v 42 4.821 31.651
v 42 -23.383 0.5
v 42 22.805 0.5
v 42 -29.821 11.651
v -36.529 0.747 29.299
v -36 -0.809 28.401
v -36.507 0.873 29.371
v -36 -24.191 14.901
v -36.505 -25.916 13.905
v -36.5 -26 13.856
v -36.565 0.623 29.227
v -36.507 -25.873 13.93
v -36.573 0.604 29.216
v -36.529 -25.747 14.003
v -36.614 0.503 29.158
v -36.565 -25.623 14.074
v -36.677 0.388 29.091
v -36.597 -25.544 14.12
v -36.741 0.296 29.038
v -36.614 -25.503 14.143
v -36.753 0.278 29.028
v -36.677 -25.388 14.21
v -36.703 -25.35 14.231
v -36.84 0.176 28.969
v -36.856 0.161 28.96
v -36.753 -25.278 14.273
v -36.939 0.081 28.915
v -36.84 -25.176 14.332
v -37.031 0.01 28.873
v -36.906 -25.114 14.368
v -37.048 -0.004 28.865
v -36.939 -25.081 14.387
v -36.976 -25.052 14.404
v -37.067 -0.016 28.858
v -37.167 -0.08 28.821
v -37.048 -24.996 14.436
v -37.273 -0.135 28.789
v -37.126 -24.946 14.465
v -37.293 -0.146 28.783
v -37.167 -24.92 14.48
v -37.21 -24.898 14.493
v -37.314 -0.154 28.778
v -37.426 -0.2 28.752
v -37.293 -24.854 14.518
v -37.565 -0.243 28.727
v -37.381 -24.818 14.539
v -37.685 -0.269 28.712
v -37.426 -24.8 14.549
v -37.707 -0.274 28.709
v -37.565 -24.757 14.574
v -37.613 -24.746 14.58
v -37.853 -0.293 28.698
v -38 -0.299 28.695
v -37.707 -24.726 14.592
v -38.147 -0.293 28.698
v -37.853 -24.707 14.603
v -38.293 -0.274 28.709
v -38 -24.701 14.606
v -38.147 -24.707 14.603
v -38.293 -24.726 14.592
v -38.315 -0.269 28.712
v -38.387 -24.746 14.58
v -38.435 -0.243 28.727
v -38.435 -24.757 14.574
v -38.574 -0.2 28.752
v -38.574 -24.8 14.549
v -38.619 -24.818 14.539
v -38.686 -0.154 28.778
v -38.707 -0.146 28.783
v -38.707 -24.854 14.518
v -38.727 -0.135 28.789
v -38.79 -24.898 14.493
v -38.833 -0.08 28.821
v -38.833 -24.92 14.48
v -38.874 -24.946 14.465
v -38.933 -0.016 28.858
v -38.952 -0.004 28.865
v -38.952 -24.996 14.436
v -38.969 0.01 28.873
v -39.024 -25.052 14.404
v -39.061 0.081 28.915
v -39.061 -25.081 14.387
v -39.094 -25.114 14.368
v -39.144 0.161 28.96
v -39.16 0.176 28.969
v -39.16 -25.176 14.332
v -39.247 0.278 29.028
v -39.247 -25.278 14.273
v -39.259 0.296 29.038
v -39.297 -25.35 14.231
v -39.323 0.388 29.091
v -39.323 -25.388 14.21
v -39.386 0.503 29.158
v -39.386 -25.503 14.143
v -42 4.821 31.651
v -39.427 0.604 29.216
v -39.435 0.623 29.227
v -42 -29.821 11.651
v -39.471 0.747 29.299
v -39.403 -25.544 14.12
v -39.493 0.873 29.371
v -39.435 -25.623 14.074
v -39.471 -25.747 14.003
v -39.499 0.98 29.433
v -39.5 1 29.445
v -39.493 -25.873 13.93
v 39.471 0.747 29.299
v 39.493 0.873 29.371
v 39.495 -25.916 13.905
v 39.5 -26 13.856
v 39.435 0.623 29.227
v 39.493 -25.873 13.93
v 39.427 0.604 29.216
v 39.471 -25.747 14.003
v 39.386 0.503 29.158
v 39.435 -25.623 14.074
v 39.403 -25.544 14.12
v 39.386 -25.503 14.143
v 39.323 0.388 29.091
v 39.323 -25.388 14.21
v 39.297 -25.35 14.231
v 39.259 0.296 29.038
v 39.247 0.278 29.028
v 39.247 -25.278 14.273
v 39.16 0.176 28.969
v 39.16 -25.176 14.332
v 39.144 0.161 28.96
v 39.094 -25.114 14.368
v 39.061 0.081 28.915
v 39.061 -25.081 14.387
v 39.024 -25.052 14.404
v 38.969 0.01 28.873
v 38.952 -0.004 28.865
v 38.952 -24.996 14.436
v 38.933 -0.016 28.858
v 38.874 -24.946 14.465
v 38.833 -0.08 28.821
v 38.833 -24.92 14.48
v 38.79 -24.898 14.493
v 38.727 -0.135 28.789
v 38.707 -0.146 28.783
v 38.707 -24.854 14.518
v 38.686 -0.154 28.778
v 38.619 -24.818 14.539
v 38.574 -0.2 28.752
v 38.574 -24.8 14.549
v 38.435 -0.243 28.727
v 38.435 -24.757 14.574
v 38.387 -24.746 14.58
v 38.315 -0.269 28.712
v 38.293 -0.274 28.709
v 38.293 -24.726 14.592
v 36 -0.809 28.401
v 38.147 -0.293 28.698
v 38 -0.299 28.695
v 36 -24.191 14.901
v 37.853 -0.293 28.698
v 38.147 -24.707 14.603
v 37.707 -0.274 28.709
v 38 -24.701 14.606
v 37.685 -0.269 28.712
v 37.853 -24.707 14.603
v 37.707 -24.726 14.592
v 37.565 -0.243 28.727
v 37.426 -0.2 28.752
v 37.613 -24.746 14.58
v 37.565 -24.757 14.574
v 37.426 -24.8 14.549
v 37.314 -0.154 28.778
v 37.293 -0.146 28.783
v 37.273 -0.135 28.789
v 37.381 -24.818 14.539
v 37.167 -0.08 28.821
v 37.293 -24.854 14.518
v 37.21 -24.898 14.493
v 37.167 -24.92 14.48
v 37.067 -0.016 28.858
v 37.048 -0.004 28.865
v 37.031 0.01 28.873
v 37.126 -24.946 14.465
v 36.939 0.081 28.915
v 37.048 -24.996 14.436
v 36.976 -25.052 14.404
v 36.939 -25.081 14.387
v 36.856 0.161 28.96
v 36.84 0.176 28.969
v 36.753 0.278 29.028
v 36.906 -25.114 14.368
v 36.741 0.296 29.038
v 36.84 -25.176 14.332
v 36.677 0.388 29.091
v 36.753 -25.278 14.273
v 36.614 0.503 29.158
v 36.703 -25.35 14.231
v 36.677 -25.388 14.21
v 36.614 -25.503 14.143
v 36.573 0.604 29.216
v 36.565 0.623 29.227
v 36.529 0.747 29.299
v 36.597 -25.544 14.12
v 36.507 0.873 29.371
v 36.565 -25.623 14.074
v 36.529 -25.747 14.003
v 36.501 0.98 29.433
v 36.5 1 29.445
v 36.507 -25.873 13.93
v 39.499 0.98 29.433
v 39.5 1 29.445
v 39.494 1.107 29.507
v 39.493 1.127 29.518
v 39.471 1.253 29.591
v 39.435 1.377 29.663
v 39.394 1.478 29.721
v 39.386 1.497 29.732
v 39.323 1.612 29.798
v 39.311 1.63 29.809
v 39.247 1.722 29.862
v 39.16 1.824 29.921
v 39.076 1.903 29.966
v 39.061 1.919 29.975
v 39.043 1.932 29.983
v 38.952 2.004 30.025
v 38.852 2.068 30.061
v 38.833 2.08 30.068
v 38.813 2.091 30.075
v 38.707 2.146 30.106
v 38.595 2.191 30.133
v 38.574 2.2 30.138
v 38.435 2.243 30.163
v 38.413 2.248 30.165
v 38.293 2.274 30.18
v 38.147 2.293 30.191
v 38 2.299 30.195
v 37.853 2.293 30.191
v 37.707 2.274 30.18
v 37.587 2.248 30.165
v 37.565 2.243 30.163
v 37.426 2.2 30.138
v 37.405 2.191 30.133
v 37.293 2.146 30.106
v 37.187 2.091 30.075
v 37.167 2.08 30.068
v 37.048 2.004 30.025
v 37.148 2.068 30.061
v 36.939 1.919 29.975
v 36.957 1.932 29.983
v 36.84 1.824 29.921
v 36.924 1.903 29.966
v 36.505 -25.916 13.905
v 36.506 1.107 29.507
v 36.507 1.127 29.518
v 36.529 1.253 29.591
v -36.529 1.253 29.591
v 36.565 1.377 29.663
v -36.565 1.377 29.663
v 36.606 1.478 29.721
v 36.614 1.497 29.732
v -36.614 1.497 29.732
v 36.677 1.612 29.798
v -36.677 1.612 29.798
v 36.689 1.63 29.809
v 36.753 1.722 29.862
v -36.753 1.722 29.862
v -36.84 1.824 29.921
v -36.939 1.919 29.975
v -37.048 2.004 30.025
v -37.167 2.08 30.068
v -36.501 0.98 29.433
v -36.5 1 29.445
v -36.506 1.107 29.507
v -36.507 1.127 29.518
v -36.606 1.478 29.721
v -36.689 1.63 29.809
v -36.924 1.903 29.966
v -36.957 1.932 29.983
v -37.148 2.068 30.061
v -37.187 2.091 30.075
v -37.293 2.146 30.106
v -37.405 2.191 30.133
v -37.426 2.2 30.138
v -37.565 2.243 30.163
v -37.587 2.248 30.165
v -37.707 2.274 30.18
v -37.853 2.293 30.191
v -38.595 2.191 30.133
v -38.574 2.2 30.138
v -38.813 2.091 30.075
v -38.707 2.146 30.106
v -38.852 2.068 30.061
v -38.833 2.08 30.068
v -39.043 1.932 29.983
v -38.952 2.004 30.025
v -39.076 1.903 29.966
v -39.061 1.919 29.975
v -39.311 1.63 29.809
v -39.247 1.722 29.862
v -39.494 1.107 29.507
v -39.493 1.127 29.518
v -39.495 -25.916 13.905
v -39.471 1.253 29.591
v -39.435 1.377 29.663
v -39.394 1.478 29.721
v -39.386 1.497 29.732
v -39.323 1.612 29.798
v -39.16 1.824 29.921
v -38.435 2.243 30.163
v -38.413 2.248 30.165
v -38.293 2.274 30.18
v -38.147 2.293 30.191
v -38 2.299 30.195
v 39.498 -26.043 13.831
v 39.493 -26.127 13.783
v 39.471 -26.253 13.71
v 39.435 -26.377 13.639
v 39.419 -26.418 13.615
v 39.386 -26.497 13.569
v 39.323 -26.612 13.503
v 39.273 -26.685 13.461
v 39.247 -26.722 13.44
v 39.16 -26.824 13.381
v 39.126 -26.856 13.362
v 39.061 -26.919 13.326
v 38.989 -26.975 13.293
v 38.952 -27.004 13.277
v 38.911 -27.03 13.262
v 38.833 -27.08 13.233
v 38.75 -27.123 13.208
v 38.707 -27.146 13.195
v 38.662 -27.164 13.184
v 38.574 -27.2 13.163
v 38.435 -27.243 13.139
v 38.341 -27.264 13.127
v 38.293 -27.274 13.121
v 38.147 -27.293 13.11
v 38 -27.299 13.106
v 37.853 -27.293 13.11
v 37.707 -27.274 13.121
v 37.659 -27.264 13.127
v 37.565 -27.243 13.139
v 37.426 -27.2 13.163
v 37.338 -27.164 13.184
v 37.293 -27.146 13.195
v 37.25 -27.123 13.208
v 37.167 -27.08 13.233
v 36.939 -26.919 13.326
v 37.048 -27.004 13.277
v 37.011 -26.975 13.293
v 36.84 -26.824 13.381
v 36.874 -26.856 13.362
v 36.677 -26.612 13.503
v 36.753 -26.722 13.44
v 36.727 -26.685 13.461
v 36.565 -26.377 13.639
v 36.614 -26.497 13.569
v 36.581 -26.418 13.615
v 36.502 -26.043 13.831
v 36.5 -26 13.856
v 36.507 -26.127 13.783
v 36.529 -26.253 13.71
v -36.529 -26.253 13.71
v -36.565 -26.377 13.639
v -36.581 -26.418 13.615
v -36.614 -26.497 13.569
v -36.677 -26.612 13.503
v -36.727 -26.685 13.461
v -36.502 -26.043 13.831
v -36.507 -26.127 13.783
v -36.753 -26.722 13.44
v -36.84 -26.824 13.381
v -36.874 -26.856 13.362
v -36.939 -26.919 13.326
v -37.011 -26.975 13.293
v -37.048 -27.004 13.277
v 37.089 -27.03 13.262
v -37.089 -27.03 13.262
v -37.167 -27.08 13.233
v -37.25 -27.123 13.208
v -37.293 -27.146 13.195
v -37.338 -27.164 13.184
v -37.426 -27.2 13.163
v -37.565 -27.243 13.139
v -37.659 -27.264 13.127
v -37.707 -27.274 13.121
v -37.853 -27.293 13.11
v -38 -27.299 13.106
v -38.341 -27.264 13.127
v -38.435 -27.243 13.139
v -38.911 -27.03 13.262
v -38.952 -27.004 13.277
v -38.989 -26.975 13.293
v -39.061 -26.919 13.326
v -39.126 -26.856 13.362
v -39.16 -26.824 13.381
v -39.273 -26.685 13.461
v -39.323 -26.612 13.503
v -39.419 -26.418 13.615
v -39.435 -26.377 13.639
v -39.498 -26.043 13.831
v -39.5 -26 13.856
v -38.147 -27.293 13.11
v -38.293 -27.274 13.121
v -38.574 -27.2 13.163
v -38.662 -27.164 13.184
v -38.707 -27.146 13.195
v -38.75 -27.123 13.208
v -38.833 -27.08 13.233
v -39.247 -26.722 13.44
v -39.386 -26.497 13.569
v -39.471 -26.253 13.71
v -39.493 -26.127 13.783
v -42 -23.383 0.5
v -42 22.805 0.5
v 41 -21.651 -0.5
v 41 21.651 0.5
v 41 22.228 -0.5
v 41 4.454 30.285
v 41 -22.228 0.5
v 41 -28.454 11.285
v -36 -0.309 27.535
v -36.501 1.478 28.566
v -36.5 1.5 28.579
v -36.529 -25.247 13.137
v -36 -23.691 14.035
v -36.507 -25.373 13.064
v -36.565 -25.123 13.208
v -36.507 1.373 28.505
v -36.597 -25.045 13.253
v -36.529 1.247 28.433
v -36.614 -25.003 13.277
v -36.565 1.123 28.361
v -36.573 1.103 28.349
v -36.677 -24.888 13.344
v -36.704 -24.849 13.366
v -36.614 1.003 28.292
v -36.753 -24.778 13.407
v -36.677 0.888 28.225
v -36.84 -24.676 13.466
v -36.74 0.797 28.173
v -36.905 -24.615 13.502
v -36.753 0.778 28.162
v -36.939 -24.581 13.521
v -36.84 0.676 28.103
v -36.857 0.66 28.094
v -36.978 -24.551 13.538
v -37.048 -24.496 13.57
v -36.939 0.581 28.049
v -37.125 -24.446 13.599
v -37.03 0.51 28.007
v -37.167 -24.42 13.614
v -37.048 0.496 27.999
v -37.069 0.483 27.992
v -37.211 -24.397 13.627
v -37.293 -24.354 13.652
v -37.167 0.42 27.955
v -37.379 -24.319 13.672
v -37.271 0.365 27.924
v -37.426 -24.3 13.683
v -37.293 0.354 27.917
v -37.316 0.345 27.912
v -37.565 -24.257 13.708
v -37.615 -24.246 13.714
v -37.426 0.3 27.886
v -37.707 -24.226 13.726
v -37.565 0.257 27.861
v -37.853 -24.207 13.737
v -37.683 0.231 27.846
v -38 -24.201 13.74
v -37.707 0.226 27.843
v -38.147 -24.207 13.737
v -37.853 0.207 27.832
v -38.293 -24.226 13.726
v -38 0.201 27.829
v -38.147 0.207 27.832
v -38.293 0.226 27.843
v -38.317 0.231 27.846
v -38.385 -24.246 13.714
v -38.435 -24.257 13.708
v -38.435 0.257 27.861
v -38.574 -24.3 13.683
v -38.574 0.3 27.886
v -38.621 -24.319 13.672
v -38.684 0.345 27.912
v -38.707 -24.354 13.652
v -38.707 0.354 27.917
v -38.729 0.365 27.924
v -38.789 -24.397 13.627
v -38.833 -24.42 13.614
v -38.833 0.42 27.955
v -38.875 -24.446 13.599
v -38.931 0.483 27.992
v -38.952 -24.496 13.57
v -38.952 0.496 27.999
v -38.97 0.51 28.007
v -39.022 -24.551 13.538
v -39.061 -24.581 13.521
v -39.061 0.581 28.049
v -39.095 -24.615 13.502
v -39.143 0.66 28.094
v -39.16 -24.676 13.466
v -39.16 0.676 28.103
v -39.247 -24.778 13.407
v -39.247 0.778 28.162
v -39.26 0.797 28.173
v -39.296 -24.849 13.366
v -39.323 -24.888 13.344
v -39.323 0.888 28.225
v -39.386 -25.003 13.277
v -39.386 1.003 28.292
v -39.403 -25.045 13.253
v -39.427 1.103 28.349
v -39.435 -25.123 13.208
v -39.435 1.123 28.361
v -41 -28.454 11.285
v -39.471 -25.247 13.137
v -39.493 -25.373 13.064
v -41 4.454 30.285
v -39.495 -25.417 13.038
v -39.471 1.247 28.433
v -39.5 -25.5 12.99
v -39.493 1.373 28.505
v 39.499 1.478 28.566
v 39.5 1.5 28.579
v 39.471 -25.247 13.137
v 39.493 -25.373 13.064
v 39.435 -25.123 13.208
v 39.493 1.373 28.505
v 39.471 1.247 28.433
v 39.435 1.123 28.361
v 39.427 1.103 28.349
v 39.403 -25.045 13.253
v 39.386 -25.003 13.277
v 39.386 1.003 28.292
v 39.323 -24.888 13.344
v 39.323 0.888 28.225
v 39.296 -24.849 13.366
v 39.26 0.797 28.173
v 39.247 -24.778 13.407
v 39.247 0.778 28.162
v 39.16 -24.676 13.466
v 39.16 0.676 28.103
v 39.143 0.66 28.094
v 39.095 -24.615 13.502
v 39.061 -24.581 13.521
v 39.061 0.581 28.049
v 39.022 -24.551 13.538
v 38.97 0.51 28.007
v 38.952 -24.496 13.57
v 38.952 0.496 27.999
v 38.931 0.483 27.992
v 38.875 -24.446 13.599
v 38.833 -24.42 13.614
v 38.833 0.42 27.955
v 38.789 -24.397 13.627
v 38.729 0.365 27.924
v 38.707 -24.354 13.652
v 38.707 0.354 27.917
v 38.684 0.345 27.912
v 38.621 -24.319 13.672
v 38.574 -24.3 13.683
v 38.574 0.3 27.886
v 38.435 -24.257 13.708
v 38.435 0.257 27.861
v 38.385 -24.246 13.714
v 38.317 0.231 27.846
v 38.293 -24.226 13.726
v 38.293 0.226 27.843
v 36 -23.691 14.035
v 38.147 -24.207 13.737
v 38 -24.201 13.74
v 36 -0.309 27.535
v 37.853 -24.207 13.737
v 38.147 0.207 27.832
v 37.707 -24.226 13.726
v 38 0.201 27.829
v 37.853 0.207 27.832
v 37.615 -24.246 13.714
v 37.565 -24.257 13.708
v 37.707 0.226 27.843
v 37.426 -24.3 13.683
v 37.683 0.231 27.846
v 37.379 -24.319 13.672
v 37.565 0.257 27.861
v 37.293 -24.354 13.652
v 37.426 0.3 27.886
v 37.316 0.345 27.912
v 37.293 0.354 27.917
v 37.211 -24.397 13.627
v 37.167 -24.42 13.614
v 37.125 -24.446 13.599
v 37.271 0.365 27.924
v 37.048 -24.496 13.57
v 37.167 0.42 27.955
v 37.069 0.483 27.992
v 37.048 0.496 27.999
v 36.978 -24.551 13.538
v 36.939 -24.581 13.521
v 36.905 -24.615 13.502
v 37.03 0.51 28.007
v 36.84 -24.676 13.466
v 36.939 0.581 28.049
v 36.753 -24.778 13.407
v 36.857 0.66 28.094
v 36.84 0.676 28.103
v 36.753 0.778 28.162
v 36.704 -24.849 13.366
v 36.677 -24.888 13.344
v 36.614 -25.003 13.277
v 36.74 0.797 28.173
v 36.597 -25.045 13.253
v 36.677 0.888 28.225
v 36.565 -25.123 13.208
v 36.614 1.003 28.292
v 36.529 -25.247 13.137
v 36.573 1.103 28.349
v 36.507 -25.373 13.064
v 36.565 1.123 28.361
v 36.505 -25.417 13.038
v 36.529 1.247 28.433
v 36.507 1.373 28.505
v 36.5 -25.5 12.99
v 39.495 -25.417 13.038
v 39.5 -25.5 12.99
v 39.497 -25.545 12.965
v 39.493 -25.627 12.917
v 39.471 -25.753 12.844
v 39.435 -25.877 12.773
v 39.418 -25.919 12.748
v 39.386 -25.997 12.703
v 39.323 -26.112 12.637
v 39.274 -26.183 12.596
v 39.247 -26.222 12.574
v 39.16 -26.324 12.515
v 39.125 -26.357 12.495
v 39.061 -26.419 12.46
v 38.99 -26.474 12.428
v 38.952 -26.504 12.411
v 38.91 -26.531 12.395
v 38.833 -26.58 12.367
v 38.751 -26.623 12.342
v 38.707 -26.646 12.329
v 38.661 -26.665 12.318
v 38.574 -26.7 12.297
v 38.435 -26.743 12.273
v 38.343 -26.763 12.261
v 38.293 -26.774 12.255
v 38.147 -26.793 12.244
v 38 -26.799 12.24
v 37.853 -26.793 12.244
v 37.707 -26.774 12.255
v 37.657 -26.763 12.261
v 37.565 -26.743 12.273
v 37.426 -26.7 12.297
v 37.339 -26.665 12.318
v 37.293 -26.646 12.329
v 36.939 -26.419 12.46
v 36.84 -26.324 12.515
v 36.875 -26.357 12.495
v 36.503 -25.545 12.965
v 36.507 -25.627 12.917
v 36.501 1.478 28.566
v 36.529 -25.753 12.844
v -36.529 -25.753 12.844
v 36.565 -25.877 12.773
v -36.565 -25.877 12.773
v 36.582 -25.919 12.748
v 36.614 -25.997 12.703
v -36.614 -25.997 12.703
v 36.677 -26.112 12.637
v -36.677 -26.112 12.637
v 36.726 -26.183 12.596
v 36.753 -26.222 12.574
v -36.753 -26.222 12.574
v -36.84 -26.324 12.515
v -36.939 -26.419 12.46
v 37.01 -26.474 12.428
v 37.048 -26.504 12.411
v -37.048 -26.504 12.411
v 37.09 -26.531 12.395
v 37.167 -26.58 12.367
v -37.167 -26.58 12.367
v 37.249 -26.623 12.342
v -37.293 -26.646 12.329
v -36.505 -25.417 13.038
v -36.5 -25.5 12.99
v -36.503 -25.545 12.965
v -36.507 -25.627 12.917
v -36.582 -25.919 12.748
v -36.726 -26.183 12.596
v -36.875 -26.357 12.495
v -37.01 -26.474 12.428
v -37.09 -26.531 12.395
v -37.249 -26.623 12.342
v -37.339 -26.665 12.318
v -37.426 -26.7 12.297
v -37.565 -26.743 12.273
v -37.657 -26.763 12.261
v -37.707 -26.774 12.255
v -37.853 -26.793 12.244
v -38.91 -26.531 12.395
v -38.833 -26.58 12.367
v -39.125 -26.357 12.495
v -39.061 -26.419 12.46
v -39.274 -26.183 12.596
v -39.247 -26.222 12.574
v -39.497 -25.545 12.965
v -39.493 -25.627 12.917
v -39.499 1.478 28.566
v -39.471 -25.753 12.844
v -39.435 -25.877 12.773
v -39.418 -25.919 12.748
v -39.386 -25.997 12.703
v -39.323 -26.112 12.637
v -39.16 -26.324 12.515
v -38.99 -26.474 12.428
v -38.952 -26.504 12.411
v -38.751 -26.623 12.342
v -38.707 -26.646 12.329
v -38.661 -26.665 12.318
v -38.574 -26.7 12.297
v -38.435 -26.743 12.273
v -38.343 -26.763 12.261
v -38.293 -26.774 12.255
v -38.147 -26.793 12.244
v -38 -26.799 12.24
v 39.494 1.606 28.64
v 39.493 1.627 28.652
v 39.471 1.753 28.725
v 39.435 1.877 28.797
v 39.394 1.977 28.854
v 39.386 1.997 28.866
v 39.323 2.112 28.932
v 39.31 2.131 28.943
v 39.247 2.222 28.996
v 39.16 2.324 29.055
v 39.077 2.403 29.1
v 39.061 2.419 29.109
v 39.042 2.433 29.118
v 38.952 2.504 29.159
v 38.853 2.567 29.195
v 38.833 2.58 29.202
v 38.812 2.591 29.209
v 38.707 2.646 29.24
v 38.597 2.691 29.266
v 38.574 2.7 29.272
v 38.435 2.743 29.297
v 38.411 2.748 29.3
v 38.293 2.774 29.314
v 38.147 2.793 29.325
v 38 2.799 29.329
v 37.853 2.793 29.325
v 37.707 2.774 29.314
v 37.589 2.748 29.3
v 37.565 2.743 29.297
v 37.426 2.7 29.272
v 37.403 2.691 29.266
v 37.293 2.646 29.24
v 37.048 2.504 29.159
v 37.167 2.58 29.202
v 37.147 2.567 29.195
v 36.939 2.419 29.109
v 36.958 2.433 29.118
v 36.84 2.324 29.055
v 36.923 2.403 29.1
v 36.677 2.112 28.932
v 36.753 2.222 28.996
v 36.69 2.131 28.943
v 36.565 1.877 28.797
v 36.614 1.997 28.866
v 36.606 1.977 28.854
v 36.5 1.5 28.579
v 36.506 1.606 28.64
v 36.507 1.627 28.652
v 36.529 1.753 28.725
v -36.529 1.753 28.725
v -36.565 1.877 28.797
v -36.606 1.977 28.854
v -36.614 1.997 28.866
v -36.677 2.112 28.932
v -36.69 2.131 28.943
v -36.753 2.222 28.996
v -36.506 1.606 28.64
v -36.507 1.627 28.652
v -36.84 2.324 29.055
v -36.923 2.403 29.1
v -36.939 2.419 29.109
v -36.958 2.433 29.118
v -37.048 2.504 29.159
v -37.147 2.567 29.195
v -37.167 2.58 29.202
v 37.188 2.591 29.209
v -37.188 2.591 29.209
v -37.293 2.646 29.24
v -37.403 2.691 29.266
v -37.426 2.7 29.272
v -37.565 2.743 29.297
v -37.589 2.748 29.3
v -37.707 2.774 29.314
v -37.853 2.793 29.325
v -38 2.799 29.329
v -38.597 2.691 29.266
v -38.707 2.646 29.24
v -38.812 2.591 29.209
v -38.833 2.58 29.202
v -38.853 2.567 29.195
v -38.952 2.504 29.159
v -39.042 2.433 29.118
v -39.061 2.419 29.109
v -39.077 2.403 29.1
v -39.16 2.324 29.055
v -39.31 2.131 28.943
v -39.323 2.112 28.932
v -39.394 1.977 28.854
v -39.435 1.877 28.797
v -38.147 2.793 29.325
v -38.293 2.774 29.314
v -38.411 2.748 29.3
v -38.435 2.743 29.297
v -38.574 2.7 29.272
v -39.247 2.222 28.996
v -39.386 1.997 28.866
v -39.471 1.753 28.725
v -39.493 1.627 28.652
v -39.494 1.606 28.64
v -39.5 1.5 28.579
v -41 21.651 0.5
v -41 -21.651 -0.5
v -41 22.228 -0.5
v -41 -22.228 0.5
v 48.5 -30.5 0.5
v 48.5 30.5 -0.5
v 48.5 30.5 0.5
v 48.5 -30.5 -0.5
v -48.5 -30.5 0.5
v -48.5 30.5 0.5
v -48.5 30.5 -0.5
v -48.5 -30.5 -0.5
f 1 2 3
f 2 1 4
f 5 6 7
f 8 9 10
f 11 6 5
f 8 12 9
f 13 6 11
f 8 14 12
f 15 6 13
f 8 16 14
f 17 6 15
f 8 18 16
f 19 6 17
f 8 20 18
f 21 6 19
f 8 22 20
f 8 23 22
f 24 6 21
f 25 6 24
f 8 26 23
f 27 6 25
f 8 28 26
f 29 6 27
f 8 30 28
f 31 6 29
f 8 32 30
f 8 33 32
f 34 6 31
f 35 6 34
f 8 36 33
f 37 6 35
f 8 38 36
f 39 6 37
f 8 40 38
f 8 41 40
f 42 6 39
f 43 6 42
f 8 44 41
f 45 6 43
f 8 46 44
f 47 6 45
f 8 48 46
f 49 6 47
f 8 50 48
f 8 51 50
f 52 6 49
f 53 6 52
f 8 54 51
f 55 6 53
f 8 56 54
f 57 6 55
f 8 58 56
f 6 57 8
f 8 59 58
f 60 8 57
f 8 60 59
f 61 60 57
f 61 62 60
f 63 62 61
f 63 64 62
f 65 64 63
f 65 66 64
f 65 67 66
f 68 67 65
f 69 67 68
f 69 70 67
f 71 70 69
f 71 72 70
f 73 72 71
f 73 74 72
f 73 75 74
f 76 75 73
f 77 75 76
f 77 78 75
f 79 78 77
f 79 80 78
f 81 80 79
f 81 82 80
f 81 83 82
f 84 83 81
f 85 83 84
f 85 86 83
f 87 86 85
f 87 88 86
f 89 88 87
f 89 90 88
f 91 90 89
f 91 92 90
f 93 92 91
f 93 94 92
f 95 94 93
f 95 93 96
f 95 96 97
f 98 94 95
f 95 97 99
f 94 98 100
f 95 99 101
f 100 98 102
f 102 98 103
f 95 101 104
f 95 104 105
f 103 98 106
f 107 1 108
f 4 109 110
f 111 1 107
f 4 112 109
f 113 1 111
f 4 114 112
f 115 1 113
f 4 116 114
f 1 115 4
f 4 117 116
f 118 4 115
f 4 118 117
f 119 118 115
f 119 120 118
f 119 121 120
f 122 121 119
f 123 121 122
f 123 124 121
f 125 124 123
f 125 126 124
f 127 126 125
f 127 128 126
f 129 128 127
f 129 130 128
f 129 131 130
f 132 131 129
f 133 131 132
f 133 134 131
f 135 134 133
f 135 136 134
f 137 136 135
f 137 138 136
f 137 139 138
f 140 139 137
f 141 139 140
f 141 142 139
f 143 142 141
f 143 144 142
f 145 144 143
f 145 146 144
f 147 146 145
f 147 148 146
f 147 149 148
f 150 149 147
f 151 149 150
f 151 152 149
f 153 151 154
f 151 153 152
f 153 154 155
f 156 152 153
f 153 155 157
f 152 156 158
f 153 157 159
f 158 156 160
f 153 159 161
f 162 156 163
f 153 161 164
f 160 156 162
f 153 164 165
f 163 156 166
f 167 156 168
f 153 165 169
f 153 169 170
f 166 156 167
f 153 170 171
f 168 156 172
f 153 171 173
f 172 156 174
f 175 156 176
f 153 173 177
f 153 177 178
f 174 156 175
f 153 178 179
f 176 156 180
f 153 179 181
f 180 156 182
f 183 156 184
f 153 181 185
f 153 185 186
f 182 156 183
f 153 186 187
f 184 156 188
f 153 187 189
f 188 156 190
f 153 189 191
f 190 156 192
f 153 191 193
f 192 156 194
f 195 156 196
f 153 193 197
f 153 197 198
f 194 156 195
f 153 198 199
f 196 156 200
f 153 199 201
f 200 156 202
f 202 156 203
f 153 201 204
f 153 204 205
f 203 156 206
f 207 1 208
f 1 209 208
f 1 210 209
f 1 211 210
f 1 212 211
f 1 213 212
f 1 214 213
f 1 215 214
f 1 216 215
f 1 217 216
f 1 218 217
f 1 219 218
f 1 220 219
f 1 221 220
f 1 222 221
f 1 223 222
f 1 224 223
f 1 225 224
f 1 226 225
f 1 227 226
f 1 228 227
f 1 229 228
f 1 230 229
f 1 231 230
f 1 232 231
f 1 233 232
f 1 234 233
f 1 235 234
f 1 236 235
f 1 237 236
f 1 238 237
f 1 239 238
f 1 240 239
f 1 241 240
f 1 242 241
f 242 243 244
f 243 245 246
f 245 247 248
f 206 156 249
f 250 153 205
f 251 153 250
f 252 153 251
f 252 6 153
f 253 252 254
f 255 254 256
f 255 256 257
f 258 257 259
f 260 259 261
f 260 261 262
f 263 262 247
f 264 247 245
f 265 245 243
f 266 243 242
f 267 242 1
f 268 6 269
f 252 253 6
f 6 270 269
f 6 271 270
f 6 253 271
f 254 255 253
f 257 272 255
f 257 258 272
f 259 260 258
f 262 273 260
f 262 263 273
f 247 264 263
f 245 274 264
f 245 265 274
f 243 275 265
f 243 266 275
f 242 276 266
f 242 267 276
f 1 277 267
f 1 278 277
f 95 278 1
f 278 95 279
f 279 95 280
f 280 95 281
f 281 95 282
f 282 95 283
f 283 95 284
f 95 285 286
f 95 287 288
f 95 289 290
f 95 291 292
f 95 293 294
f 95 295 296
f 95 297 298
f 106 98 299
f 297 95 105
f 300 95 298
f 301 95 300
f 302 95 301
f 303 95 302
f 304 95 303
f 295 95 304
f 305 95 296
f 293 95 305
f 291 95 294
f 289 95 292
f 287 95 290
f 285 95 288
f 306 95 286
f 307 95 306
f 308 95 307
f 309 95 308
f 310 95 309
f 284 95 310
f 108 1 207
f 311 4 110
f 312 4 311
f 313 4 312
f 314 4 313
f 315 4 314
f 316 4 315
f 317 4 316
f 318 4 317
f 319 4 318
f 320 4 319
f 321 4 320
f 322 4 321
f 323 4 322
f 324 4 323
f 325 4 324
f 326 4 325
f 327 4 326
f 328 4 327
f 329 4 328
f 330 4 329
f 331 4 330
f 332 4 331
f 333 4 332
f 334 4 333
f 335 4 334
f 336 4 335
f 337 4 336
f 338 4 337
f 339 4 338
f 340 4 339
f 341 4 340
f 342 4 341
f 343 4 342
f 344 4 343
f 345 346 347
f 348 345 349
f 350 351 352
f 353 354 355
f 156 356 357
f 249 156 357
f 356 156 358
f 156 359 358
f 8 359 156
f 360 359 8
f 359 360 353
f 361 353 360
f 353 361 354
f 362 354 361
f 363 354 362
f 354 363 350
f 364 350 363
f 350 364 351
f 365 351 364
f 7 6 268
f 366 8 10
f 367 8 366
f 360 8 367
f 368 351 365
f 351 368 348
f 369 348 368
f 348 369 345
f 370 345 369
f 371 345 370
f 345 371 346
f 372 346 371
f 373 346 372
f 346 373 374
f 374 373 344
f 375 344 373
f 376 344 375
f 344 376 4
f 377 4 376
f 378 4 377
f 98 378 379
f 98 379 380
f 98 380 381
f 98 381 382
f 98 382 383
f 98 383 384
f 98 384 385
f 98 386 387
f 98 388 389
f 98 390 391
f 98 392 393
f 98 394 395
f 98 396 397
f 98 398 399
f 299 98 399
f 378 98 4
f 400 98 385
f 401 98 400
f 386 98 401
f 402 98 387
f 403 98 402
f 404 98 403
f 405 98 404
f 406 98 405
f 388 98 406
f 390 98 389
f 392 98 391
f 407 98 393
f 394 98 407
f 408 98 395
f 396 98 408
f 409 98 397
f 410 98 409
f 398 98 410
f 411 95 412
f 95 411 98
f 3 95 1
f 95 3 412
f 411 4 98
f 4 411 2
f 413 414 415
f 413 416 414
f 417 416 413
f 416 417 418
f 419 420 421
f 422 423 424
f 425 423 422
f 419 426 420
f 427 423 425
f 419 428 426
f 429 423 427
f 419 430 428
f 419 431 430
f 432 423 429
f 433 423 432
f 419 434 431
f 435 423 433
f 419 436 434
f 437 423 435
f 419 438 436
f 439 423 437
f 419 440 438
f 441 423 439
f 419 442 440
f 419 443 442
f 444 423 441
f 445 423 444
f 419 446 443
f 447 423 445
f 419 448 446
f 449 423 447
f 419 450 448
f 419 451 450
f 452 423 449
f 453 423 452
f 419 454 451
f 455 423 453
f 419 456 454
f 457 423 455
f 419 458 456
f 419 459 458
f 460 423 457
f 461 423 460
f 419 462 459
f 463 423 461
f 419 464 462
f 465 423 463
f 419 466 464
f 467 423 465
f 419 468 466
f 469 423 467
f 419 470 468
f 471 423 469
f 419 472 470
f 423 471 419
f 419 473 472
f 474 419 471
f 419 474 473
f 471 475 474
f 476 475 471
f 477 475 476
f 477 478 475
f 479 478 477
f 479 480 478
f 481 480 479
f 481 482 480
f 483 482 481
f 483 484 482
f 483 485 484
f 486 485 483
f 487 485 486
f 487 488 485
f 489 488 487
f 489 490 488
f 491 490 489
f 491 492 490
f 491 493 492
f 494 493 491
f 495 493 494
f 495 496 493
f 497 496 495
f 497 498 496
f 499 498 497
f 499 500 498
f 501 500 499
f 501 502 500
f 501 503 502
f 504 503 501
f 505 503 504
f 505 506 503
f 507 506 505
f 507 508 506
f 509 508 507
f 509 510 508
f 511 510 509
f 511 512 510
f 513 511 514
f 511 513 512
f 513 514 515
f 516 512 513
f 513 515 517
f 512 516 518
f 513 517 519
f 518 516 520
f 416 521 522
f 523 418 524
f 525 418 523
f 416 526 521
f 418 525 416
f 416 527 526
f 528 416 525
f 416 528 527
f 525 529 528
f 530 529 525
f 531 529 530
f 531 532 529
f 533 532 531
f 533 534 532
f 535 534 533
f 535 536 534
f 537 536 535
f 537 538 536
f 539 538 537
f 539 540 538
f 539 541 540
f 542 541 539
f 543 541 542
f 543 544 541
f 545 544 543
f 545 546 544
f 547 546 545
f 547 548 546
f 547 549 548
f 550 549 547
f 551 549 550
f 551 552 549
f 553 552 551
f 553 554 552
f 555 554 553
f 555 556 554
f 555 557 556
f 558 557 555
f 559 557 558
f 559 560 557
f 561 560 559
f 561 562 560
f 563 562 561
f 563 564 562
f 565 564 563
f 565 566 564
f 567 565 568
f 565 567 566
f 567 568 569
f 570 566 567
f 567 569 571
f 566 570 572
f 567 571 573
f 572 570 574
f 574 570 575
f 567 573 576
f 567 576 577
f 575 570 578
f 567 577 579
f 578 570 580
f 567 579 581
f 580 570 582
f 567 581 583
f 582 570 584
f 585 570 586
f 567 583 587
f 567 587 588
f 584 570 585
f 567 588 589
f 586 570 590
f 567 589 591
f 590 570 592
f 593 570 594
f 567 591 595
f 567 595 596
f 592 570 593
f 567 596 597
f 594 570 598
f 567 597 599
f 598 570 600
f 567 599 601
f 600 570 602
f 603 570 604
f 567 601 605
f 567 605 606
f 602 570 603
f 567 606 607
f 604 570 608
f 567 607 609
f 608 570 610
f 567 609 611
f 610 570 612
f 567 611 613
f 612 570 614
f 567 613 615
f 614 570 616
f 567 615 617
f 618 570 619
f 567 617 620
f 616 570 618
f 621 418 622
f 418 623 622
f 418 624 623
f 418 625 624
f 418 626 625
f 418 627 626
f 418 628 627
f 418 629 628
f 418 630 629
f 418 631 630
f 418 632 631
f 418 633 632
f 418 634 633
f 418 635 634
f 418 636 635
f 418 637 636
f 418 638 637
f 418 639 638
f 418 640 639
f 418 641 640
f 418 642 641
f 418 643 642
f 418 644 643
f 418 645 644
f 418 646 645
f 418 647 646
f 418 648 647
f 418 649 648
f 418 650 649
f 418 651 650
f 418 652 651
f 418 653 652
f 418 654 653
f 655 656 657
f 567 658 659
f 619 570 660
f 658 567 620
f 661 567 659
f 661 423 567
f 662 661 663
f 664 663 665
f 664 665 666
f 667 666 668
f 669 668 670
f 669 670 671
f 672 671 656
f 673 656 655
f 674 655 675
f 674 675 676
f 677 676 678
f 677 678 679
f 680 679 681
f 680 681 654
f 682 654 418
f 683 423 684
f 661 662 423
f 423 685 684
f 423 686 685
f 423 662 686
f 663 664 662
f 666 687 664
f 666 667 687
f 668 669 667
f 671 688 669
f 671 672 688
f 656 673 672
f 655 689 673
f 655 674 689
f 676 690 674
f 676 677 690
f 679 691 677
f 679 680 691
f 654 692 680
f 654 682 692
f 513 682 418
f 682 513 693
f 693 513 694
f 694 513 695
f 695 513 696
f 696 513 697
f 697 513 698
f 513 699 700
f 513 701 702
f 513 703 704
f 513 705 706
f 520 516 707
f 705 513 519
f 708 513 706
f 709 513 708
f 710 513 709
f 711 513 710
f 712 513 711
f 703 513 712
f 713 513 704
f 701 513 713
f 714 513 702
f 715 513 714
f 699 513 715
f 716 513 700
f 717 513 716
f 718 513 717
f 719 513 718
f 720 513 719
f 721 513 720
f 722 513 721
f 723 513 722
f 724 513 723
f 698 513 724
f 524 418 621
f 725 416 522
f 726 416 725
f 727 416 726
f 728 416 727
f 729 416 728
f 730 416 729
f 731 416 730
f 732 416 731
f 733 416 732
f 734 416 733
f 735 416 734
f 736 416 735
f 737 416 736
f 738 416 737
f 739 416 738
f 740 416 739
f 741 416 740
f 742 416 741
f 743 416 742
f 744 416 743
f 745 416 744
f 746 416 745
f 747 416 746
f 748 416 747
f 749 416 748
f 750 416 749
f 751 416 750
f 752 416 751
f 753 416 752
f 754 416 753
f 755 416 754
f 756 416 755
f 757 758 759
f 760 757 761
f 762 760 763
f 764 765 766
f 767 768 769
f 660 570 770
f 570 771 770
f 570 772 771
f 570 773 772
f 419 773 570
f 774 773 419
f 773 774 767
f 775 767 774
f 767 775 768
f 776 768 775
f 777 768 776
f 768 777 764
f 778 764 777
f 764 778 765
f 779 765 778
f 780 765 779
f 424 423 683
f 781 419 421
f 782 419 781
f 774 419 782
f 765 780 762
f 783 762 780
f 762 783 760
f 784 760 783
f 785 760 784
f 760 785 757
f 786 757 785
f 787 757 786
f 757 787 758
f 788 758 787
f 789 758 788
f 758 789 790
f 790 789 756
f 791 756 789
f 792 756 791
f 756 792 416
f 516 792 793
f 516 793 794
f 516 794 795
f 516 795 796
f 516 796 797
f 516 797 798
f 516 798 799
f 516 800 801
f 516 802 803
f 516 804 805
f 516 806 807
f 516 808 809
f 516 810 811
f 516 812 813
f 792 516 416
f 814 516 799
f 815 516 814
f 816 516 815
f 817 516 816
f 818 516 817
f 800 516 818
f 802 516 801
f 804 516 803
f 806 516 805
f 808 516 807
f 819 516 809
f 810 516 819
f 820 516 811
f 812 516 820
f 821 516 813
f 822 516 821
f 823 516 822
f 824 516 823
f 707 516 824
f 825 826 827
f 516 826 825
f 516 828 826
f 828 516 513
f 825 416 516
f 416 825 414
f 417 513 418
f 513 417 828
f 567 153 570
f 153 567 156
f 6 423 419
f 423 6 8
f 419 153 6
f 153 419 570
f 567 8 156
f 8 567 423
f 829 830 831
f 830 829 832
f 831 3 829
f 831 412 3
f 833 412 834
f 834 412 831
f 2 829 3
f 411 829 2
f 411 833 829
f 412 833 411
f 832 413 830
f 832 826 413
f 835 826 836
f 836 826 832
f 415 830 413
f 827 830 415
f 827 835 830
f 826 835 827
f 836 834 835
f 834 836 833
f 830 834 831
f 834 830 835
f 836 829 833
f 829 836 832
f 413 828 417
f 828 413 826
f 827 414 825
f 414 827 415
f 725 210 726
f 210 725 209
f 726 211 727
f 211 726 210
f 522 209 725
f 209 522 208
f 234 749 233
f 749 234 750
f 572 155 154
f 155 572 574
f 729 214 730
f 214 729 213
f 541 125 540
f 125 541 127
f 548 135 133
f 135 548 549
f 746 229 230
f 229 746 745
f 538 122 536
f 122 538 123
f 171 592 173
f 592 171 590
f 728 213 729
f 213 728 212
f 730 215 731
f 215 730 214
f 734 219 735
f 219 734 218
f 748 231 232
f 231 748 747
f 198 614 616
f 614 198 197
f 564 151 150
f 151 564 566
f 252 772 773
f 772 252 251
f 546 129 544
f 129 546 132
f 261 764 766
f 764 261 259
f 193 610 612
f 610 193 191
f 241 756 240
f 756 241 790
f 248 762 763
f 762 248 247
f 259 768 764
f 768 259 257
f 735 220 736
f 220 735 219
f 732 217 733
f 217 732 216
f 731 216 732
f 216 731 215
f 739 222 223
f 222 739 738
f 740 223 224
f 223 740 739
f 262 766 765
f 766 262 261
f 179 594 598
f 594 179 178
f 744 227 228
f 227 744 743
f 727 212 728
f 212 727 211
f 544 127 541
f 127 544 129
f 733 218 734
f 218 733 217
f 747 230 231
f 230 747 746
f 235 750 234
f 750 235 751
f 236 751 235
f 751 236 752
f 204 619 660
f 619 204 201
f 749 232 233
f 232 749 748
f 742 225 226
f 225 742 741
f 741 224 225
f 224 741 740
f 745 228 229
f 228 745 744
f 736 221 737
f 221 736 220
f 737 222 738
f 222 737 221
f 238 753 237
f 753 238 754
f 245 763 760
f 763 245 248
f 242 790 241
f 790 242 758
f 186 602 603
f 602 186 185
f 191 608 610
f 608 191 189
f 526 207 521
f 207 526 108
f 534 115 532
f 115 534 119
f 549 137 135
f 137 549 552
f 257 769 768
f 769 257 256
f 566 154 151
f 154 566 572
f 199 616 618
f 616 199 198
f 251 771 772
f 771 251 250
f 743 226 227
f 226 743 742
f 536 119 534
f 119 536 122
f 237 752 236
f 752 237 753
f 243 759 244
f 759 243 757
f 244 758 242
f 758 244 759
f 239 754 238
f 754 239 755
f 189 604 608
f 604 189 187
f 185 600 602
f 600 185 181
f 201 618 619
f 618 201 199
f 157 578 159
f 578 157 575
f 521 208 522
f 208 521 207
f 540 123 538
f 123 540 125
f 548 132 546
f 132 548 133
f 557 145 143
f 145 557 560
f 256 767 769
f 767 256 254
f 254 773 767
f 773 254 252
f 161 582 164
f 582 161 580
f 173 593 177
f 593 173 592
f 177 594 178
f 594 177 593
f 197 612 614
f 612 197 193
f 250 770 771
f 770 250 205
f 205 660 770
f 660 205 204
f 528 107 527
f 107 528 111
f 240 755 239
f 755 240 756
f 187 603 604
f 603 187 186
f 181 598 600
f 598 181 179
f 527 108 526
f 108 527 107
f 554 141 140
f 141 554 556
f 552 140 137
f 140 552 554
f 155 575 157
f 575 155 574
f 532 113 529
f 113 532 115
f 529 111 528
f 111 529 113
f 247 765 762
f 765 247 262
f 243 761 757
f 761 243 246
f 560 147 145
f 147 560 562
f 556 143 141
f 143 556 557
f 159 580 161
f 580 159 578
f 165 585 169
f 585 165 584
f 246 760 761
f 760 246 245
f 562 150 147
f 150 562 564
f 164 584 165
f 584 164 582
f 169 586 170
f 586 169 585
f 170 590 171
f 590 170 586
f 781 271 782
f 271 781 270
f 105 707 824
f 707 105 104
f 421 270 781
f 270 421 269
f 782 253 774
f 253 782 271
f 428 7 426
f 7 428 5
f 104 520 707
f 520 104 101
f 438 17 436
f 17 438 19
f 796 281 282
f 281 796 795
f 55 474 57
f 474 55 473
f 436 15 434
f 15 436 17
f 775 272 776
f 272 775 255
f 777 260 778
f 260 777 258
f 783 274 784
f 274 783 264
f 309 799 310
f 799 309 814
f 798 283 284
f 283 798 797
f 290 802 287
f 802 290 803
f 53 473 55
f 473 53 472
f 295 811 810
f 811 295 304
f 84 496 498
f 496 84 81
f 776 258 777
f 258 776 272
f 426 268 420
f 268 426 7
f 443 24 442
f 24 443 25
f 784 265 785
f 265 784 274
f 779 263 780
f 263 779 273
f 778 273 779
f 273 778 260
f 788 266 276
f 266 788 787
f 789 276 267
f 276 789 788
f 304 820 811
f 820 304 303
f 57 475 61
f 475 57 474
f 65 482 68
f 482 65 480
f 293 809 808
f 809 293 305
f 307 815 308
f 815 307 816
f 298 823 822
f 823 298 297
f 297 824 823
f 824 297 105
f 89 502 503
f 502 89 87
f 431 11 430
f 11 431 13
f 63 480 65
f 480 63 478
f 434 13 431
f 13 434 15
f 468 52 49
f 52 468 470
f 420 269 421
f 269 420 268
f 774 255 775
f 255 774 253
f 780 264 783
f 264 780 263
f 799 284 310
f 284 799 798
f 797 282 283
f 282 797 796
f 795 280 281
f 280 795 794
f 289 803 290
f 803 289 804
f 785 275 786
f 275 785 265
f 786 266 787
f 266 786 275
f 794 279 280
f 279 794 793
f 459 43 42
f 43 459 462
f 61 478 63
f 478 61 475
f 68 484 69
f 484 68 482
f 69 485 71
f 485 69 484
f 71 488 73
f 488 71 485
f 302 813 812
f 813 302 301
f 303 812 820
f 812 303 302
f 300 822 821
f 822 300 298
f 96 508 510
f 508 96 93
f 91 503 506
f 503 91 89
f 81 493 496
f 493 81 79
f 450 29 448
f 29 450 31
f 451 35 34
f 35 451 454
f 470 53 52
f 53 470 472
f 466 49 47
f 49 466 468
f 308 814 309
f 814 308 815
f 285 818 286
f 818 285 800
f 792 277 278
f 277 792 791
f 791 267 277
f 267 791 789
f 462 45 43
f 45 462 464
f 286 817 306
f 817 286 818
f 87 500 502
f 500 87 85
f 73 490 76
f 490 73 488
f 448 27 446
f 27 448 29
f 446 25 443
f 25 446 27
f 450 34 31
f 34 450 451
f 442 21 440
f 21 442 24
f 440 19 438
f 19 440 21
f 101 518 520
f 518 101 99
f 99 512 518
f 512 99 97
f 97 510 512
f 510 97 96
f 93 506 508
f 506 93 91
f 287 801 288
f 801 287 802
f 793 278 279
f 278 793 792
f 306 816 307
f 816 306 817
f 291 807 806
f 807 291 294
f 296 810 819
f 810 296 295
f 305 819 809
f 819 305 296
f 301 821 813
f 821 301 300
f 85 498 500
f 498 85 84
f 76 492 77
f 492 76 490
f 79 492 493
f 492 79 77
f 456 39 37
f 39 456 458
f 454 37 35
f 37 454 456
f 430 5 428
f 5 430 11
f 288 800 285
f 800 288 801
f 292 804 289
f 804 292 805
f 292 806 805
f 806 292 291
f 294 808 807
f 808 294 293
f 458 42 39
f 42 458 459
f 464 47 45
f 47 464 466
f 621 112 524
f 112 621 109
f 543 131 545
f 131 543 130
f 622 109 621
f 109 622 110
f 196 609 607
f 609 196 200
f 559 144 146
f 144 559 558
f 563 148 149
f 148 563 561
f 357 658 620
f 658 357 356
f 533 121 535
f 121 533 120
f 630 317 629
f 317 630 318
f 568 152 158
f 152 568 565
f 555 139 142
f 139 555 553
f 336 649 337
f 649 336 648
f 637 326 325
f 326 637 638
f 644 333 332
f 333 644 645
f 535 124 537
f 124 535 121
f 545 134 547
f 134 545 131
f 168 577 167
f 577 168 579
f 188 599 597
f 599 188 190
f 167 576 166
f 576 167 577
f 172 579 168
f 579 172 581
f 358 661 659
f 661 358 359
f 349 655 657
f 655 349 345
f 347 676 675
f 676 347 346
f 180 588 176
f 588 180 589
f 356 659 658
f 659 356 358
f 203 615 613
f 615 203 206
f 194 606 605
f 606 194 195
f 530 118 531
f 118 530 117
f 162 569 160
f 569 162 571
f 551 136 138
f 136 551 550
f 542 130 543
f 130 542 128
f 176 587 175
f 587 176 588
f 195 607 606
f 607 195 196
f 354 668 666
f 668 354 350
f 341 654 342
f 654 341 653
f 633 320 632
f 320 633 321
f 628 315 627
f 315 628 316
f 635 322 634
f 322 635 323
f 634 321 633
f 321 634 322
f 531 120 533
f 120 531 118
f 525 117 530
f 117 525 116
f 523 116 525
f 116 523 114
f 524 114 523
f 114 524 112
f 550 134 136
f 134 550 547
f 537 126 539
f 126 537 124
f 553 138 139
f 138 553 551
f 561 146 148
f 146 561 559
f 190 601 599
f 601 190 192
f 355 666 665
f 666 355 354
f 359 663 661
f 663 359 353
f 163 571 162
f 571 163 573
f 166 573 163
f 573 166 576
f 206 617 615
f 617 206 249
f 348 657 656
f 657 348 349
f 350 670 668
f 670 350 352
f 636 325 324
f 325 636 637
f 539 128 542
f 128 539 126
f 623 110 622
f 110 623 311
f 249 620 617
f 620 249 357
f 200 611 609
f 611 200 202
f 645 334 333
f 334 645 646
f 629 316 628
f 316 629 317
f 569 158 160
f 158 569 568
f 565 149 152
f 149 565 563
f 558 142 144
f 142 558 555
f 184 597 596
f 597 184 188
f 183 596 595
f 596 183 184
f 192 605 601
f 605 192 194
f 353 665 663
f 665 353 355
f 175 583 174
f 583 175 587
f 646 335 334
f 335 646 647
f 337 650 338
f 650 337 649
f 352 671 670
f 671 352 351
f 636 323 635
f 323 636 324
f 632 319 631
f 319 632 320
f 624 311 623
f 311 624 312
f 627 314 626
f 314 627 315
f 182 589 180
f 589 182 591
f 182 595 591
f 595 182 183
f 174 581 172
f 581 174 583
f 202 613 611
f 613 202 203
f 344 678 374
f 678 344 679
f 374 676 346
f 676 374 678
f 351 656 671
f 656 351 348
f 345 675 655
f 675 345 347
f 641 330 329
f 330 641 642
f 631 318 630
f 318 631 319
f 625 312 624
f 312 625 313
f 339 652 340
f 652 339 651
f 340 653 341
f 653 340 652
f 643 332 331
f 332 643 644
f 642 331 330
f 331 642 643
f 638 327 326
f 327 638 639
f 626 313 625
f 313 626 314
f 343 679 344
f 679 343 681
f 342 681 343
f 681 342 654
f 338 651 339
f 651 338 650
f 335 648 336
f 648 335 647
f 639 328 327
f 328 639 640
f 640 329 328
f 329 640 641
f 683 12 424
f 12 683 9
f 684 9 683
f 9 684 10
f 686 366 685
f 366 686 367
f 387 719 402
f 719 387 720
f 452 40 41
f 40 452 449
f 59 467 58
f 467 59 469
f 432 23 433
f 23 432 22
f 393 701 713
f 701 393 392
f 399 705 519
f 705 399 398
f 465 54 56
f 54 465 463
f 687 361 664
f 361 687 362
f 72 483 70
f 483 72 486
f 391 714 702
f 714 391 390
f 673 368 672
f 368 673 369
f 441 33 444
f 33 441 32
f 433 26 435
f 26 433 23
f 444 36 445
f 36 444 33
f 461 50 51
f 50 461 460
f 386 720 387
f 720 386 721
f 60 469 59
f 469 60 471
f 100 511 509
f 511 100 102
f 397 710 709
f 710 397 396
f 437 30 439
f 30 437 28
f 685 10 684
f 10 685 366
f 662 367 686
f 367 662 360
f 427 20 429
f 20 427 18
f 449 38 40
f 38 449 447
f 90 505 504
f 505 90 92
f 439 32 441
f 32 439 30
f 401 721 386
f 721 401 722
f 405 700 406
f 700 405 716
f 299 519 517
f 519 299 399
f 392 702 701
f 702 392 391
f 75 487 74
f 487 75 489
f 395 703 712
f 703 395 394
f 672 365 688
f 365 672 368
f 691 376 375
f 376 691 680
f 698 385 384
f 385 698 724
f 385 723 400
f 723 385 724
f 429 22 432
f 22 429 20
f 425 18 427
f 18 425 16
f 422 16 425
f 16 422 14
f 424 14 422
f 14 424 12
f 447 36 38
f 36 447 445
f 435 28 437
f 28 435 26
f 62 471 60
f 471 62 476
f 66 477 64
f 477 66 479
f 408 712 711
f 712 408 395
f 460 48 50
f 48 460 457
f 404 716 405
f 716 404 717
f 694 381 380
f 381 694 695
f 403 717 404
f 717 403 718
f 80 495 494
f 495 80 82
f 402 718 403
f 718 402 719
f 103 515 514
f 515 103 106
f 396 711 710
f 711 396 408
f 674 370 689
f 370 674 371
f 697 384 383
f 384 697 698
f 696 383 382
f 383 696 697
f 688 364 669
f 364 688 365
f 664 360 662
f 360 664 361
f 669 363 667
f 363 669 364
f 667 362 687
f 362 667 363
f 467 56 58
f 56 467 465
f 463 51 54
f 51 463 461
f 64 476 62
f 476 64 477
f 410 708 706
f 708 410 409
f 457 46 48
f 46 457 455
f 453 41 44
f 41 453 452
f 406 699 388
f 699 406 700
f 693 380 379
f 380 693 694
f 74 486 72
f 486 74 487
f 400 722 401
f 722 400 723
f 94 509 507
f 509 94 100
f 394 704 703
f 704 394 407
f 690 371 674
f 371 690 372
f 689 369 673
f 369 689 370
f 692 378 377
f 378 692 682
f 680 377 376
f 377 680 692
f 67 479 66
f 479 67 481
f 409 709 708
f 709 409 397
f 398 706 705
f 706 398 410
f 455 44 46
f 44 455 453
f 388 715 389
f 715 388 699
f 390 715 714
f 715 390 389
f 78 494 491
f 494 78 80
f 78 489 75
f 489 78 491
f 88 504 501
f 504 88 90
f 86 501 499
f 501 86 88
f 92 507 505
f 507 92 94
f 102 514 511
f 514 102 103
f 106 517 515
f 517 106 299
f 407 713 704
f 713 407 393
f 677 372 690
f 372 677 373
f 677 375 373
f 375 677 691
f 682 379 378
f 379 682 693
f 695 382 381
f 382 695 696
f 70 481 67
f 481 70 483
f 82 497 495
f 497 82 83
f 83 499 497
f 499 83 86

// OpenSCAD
module ScrewHole(screwDiameter, angle)
{
    color("red")
    rotate([angle, 0, 0])
    cylinder(h=100, r=screwDiameter/2, center=true, $fn=64);
}

module AngledMount(l=120, w=50, h=50, wall=2, hole_l=100, hole_w=30, angle=30)
{
    difference()
    {
        // Main box shape, rotated
        rotate([angle, 0, 0])
        difference()
        {
            cube([l, w, h], center=true);
            cube([l-wall, w-wall, h-wall], center=true);
            cube([hole_l, hole_w, h*2], center=true);
        }

        // Cut off the bottom half
        translate([0, 0, -h*1/2])
        cube([l*2, w*2, h], center=true);
    }

    // Base
    difference()
    {
        cube([5+l+wall*4, 5+w+wall*8, wall/2], center=true);

        rotate([angle, 0, 0])
        cube([l-wall, w-wall, h], center=true);
    }
}

module AngledMountFor16x2LCD()
{
    angle = 30;
    screwDiameter = 3;
    lpos = (73 + screwDiameter) / 2; // Horizontal position of screw holes
    wpos = (33 + screwDiameter) / 2; // Vertical position of screw holes

    difference()
    {
        AngledMount(l=84, w=40, h=50, wall=2, hole_l=72, hole_w=27, angle=angle);

        // Screw holes
        translate([ lpos,  wpos, 0]) ScrewHole(screwDiameter, angle);
        translate([-lpos,  wpos, 0]) ScrewHole(screwDiameter, angle);
        translate([ lpos, -wpos, 0]) ScrewHole(screwDiameter, angle);
        translate([-lpos, -wpos, 0]) ScrewHole(screwDiameter, angle);
    }
}

//AngledMount();

AngledMountFor16x2LCD();
